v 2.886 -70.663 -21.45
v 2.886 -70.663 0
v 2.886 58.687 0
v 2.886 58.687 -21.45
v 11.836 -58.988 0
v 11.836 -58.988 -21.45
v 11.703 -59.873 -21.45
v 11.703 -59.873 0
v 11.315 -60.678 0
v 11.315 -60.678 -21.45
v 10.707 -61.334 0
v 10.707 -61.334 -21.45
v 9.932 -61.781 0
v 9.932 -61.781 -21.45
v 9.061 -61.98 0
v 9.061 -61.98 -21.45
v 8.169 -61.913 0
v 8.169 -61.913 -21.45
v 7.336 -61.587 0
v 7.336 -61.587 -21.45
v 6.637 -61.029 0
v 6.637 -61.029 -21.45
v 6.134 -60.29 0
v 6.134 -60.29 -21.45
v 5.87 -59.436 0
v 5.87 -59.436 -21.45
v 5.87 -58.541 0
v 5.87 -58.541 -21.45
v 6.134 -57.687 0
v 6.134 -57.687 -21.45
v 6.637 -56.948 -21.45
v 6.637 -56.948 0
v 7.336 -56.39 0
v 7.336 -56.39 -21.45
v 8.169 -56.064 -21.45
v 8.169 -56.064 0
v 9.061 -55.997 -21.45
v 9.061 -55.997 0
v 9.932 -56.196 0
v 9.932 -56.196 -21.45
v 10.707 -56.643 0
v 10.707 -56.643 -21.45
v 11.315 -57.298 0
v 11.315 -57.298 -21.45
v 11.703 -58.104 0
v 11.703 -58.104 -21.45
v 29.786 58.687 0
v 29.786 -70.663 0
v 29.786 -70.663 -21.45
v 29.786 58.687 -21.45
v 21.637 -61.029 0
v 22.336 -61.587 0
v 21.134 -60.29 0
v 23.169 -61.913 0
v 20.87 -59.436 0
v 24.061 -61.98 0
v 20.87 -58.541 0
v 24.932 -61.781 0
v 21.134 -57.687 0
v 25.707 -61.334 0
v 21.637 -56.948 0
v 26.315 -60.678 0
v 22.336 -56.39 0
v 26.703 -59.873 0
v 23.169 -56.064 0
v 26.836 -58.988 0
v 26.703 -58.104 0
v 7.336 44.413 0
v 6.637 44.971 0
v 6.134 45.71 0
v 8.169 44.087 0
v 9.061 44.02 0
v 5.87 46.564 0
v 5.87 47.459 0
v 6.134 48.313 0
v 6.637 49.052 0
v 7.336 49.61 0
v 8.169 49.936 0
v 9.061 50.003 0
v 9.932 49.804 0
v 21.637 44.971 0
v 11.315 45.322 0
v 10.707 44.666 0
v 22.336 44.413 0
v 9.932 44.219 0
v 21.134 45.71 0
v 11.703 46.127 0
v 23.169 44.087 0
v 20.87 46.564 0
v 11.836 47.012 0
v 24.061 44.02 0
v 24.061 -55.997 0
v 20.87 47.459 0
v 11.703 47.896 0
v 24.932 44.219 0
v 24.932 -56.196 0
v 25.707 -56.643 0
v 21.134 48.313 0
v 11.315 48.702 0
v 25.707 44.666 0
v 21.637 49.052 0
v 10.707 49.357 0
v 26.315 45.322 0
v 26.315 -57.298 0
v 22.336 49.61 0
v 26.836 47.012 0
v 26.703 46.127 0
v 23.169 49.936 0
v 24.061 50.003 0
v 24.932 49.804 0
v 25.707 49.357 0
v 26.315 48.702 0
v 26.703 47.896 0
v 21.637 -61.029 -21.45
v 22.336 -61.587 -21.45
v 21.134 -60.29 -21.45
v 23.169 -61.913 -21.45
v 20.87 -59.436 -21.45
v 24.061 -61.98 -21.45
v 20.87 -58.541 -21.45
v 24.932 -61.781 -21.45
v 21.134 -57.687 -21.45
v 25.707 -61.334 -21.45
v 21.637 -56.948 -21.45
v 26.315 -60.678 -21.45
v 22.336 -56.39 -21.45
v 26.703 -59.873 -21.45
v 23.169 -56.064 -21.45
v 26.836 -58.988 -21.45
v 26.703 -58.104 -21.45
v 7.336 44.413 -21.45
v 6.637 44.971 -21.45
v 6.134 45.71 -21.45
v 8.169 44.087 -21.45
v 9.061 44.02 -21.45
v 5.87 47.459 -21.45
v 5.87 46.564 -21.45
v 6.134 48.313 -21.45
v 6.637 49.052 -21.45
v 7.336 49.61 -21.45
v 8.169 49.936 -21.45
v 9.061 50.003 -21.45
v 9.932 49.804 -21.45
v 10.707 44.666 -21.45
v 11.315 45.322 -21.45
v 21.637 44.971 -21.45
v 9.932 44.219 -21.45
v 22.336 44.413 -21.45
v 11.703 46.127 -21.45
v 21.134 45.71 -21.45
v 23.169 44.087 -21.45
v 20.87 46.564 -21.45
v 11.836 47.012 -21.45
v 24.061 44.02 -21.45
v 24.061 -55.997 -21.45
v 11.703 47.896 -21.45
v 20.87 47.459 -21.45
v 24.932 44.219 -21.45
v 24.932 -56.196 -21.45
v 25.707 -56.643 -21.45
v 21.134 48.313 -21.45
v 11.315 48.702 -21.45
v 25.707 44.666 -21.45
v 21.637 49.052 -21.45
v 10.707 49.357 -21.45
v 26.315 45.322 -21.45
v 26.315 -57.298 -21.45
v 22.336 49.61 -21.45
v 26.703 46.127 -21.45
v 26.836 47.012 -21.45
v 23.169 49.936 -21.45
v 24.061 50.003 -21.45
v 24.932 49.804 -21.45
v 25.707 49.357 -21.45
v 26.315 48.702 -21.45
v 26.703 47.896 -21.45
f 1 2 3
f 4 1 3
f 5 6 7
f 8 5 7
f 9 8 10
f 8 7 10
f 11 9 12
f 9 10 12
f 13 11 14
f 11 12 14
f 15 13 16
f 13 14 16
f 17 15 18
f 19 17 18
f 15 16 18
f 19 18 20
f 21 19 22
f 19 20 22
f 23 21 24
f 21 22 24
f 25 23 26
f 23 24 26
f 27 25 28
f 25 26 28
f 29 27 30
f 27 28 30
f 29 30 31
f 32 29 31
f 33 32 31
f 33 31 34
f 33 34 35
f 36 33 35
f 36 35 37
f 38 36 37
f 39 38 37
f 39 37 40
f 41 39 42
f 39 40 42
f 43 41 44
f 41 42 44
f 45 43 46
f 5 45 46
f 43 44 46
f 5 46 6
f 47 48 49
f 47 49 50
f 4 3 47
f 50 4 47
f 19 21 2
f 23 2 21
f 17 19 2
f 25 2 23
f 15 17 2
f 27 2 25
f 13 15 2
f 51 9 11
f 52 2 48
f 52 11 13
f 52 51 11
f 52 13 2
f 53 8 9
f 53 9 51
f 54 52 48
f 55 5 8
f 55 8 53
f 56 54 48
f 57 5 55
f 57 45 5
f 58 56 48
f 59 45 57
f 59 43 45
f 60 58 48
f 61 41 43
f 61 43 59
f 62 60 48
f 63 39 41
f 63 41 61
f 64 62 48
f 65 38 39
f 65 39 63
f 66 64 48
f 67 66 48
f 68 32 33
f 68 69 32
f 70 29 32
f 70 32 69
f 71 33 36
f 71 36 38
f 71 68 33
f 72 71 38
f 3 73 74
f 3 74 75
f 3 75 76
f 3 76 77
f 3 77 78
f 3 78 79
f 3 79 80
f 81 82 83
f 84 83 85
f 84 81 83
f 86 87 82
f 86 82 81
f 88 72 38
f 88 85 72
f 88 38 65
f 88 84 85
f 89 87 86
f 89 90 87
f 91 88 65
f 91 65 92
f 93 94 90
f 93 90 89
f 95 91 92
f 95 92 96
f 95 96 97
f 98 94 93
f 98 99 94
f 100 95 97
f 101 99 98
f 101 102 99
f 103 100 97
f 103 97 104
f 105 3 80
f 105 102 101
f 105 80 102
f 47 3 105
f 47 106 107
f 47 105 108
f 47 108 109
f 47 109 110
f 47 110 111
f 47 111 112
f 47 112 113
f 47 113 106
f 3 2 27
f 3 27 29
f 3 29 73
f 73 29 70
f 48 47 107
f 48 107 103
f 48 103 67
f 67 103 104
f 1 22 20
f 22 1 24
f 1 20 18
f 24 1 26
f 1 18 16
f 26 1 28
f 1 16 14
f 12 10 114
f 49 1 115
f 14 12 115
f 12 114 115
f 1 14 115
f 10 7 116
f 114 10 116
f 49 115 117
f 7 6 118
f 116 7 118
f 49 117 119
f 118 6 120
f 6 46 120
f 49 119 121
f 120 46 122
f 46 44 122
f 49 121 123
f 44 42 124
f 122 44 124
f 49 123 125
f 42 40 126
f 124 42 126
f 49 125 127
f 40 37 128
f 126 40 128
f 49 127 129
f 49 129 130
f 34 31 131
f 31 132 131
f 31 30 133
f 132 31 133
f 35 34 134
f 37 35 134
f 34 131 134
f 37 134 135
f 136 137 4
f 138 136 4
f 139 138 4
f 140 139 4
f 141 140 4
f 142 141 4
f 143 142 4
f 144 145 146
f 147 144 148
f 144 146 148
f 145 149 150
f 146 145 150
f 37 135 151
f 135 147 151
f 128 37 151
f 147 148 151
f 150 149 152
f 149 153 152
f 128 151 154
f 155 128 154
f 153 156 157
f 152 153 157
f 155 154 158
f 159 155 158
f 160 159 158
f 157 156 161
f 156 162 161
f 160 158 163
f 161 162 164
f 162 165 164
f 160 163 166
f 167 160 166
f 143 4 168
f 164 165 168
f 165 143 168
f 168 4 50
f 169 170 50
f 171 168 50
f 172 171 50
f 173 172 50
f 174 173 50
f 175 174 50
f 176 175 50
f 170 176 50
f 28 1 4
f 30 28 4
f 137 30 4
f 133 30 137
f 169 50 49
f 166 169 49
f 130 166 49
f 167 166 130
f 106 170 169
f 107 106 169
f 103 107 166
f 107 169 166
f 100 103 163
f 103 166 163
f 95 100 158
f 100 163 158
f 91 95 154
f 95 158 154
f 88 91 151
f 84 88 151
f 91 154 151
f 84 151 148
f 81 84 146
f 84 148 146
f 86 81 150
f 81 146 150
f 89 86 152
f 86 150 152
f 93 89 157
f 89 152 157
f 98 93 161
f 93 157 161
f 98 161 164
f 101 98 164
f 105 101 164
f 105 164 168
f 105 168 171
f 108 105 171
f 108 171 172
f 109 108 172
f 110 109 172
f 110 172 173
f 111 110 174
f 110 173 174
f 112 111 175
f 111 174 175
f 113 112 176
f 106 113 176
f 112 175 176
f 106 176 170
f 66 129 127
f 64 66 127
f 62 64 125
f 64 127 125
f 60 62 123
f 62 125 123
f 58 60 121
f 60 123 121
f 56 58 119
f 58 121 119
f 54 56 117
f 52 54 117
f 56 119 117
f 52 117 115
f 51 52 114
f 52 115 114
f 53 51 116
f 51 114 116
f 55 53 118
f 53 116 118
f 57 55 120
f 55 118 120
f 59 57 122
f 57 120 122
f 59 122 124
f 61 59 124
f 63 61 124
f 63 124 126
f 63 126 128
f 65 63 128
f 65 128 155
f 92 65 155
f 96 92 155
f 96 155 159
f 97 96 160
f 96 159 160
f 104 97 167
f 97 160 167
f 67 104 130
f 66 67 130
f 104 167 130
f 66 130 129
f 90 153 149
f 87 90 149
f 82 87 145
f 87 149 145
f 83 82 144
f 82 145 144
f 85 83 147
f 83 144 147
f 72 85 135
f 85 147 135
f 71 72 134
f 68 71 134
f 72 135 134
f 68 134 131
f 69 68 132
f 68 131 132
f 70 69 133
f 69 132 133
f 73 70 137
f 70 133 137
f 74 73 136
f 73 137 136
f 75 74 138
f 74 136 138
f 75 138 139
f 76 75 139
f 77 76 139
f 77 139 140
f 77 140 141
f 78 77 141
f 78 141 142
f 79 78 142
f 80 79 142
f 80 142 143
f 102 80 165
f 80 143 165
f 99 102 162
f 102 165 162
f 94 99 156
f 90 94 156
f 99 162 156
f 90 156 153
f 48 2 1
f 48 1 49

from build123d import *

# Parameters (mm, degrees)
ESBO_O1_W             = 26.9
ESBO_O1_H             = 129.35
FLANGE_BASE1_DEPTH    = 21.45
ESBO_O7_R             = 3
CORTE_EXTRUS_O1_DEPTH = 21.45


# Sheet-metal steps are written as plain solids
with BuildPart() as part:
    # Esboço1 → Flange-base1 (new body)
    with BuildSketch(Plane.XY):
        with Locations((16.336467182, -5.988425926)):
            Rectangle(ESBO_O1_W, ESBO_O1_H)
    extrude(amount=-FLANGE_BASE1_DEPTH)

    # Esboço7 → Corte-extrusão1 (cut)
    with BuildSketch(Plane(origin=(0, 0, -21.45), x_dir=(-1, 0, 0), z_dir=(0, 0, -1))):
        with Locations(Location((-23.836467182, 47.011574074, 0), (0, 0, 180))):
            Circle(ESBO_O7_R)
        with Locations(Location((-8.836467182, 47.011574074, 0), (0, 0, 180))):
            Circle(ESBO_O7_R)
        with Locations(Location((-23.836467182, -58.988425926, 0), (0, 0, 180))):
            Circle(ESBO_O7_R)
        with Locations(Location((-8.836467182, -58.988425926, 0), (0, 0, 180))):
            Circle(ESBO_O7_R)
    extrude(amount=-CORTE_EXTRUS_O1_DEPTH, mode=Mode.SUBTRACT)


solid = part.part
